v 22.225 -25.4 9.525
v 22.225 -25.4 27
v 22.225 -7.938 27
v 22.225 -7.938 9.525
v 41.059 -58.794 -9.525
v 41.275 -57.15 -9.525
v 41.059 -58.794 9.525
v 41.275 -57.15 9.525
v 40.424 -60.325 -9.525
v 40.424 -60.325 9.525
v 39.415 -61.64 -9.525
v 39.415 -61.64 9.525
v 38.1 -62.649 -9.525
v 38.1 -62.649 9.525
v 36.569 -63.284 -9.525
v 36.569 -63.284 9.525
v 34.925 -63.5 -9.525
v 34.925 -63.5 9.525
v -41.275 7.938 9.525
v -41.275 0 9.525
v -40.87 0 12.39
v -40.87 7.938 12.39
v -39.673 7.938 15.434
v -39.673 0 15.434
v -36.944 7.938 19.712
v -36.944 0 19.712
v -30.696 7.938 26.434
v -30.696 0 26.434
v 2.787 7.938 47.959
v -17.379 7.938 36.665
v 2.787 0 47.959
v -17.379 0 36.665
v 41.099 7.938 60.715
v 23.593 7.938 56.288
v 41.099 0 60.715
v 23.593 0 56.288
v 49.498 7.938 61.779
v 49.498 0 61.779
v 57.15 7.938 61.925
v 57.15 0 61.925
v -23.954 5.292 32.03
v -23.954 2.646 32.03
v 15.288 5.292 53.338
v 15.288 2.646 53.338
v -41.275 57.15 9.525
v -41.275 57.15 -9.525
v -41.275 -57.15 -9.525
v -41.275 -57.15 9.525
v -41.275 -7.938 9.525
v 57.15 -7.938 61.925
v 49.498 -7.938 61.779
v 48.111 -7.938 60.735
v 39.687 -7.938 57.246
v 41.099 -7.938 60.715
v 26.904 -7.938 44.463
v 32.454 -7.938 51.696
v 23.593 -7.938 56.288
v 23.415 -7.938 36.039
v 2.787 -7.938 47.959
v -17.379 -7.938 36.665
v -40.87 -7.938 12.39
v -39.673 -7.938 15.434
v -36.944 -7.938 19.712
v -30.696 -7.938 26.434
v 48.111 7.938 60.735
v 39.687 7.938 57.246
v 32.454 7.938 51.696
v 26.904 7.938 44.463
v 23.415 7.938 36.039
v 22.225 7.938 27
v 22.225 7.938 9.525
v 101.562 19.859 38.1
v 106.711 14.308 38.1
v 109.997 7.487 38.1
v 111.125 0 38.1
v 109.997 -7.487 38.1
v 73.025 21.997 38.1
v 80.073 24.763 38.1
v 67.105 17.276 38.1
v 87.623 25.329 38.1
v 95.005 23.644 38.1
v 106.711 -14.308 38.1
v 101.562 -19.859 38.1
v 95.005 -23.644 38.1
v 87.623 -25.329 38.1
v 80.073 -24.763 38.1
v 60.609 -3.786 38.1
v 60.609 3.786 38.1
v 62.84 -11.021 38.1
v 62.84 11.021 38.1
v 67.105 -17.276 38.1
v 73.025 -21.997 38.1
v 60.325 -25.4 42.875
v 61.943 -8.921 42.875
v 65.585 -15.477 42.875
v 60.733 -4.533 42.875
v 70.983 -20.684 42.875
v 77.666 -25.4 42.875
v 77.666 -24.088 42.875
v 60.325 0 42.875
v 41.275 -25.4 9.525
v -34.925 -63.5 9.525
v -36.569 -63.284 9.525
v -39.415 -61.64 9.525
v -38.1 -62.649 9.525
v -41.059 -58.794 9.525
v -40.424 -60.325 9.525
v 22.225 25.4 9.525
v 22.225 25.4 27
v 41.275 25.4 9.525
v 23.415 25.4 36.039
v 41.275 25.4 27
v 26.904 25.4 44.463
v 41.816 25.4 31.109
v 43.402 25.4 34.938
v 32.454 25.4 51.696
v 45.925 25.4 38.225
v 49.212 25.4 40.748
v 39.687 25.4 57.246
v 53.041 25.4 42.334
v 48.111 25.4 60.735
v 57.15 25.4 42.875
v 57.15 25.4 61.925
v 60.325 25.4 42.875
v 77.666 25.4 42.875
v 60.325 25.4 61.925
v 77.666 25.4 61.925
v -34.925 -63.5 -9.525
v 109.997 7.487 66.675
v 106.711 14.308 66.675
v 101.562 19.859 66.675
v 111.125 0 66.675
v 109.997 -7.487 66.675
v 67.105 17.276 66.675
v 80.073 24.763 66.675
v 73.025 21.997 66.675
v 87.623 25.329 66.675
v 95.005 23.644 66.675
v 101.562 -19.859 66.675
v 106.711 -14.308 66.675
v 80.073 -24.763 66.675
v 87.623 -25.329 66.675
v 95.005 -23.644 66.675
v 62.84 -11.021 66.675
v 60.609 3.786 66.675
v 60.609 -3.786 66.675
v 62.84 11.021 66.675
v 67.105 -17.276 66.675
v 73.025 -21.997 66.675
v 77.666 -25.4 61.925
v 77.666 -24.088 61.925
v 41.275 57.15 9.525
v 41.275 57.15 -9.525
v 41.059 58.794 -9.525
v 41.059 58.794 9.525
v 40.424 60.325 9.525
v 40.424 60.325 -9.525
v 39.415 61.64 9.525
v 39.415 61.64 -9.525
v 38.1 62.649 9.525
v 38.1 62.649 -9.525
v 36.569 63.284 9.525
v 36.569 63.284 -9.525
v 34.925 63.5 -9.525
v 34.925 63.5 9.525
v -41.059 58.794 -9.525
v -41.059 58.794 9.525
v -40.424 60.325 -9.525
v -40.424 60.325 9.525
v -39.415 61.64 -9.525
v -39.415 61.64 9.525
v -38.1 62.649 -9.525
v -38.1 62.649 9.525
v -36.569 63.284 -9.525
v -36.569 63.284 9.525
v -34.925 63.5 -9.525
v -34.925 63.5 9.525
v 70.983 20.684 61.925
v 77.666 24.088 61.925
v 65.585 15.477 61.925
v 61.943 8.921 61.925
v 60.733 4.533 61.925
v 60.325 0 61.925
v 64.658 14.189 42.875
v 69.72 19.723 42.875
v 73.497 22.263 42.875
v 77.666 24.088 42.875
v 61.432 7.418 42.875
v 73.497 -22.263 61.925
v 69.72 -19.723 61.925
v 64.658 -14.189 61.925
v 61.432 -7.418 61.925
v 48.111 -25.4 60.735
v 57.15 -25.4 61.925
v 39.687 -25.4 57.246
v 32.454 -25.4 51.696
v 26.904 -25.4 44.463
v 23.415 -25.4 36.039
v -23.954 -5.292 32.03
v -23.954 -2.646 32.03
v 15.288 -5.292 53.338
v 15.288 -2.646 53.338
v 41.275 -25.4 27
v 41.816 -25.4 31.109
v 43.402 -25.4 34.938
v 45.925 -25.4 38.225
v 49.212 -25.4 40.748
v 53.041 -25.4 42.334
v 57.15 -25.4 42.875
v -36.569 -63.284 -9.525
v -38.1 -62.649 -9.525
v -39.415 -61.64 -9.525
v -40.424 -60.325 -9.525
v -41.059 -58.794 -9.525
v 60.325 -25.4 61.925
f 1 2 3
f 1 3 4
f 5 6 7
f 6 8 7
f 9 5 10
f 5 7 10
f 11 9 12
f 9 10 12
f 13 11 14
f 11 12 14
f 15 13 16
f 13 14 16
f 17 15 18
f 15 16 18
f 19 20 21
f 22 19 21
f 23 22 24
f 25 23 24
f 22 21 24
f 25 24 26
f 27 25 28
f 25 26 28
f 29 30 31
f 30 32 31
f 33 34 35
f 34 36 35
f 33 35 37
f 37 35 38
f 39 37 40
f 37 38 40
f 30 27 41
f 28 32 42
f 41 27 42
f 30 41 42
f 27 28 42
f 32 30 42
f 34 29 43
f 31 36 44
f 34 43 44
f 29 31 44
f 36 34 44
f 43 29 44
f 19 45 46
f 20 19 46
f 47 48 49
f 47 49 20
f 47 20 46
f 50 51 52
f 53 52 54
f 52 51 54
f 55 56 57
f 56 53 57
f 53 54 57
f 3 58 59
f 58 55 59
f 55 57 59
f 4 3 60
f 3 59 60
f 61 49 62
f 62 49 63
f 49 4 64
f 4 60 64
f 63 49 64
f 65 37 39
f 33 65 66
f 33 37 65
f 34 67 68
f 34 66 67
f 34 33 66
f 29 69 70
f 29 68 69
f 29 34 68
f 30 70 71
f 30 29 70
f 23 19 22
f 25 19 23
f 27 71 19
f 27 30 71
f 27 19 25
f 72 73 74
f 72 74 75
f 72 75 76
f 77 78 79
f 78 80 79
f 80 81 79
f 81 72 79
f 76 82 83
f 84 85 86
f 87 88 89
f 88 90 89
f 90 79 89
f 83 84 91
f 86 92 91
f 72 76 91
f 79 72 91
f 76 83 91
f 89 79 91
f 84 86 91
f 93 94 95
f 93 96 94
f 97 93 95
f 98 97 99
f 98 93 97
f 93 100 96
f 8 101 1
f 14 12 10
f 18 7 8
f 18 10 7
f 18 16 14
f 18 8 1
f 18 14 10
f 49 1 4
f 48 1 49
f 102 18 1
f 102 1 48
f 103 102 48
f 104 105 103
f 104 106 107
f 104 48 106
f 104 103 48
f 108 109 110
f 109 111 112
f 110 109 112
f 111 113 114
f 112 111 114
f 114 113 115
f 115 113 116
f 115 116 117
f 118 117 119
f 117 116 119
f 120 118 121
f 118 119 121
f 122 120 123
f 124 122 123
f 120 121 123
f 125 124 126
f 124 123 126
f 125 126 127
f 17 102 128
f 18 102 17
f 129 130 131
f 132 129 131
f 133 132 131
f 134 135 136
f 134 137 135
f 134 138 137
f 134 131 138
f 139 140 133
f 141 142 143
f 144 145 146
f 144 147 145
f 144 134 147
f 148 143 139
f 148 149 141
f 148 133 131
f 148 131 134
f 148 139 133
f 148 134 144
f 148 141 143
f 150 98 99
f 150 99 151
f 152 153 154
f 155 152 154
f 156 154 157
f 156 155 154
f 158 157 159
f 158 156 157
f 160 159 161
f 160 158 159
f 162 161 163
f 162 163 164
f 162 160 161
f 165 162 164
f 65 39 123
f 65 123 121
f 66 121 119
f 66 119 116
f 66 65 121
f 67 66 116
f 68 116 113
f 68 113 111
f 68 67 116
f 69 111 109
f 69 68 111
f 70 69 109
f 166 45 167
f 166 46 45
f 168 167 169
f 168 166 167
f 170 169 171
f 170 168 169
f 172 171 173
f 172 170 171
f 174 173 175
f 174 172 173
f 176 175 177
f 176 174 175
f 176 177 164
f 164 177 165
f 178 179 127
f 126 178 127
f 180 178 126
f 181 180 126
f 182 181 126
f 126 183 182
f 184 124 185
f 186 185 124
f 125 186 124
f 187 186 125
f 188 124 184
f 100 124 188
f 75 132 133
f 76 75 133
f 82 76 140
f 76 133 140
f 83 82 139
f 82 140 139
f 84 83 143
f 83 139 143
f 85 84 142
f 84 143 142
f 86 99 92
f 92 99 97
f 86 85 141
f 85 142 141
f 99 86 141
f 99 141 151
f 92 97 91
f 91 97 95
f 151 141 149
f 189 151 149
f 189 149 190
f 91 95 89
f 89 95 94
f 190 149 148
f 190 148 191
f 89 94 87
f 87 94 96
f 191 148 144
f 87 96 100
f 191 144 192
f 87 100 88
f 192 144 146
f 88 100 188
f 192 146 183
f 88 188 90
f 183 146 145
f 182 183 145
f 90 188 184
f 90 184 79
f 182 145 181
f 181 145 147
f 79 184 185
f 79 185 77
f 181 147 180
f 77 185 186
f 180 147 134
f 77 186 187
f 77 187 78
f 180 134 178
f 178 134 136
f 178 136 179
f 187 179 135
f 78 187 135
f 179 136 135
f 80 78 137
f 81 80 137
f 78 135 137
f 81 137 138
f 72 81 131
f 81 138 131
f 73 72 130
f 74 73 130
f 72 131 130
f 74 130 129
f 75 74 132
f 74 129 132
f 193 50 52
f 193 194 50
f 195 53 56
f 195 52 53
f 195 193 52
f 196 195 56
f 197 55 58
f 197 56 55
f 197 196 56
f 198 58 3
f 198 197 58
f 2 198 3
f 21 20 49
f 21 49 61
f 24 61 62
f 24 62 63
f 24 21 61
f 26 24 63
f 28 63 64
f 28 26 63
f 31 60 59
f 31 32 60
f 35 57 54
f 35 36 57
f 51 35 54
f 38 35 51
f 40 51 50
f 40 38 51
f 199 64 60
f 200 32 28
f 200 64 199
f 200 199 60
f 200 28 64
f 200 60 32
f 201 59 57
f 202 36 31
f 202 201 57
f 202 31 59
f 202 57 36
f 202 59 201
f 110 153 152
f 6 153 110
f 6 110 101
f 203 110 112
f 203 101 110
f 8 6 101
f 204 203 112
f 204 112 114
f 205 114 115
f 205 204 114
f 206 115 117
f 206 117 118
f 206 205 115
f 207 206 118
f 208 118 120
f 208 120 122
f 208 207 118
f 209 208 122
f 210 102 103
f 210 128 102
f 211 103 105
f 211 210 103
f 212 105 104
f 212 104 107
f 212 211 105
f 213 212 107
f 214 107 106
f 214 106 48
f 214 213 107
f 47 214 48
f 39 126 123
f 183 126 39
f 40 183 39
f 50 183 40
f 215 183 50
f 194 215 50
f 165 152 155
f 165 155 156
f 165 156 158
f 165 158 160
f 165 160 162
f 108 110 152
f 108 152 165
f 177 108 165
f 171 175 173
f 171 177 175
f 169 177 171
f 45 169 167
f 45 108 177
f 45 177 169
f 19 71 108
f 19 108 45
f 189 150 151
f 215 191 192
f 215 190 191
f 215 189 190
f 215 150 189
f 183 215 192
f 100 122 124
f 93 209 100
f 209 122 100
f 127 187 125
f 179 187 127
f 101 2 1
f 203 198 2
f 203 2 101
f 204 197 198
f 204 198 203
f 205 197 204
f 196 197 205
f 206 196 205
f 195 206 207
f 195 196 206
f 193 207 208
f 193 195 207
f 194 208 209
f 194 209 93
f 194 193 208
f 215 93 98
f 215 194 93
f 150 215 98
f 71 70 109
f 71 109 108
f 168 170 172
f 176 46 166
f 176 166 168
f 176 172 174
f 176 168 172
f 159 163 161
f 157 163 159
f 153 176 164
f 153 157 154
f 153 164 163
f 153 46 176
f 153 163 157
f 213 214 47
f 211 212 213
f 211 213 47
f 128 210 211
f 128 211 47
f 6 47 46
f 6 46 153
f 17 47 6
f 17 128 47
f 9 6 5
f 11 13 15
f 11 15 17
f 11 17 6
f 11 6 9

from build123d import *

# Parameters (mm, degrees)
F1_DEPTH = 63.5
F2_DEPTH = 25.4
F3_DEPTH = 7.9375
F0_W     = 25.4
F0_H     = 28.575
F5_R     = 6.35


with BuildPart() as f1:
    # F0 (on Front) → F1 (new body, symmetric)
    with BuildSketch(Plane.XZ):
        Polygon((22.225, 9.525), (-41.275, 9.525), (-41.275, -9.525), (41.275, -9.525), (41.275, 9.525), align=None)
    extrude(amount=F1_DEPTH, both=True)

    # F0 (on Front) → F2 (join, symmetric)
    with BuildSketch(Plane.XZ):
        with BuildLine():
            Line((22.225, 27.000148), (22.225, 9.525))
            Line((22.225, 9.525), (41.275, 9.525))
            Line((41.275, 9.525), (41.275, 27.000148))
            ThreePointArc((41.275, 27.000148), (45.924666, 38.225454), (57.14996, 42.875148))
            Line((57.14996, 42.875148), (60.325, 42.875156))
            Line((60.325, 42.875156), (60.325, 61.925156))
            Line((60.325, 61.925156), (57.149911, 61.925148))
            ThreePointArc((57.149911, 61.925148), (32.454264, 51.695821), (22.225, 27.000148))
        make_face()
        Polygon((77.666241, 61.9252), (60.325, 61.925156), (60.325, 42.875156), (77.66629, 42.8752), align=None)
    extrude(amount=F2_DEPTH, both=True)

    # F0 (on Front) → F3 (join, symmetric)
    with BuildSketch(Plane.XZ):
        with BuildLine():
            add(Edge.make_bspline(
                [(-41.275, 9.525), (-41.347746, 28.786404), (20.412168, 63.539438), (57.149911, 61.925148)],
                knots=[0, 0, 0, 0, 111.504433, 111.504433, 111.504433, 111.504433], degree=3))
            Line((-41.275, 9.525), (22.225, 9.525))
            Line((22.225, 9.525), (22.225, 27.000148))
            ThreePointArc((22.225, 27.000148), (32.454264, 51.695821), (57.149911, 61.925148))
        make_face()
    extrude(amount=F3_DEPTH, both=True)

    # F0 (on Front) → F4 (revolve)
    with BuildSketch(Plane.XZ):
        with Locations((98.425, 52.3875)):
            Rectangle(F0_W, F0_H)
    revolve(axis=Axis((85.725, 0, 52.3875), (0, 0, -1)))

    # F5
    f5_edges = [f1.edges().sort_by_distance(p)[0] for p in [
        (41.275, -63.5, 0),
        (-41.275, -63.5, 0),
        (41.275, 63.5, 0),
        (-41.275, 63.5, 0),
    ]]
    fillet(f5_edges, radius=F5_R)


solid = f1.part
